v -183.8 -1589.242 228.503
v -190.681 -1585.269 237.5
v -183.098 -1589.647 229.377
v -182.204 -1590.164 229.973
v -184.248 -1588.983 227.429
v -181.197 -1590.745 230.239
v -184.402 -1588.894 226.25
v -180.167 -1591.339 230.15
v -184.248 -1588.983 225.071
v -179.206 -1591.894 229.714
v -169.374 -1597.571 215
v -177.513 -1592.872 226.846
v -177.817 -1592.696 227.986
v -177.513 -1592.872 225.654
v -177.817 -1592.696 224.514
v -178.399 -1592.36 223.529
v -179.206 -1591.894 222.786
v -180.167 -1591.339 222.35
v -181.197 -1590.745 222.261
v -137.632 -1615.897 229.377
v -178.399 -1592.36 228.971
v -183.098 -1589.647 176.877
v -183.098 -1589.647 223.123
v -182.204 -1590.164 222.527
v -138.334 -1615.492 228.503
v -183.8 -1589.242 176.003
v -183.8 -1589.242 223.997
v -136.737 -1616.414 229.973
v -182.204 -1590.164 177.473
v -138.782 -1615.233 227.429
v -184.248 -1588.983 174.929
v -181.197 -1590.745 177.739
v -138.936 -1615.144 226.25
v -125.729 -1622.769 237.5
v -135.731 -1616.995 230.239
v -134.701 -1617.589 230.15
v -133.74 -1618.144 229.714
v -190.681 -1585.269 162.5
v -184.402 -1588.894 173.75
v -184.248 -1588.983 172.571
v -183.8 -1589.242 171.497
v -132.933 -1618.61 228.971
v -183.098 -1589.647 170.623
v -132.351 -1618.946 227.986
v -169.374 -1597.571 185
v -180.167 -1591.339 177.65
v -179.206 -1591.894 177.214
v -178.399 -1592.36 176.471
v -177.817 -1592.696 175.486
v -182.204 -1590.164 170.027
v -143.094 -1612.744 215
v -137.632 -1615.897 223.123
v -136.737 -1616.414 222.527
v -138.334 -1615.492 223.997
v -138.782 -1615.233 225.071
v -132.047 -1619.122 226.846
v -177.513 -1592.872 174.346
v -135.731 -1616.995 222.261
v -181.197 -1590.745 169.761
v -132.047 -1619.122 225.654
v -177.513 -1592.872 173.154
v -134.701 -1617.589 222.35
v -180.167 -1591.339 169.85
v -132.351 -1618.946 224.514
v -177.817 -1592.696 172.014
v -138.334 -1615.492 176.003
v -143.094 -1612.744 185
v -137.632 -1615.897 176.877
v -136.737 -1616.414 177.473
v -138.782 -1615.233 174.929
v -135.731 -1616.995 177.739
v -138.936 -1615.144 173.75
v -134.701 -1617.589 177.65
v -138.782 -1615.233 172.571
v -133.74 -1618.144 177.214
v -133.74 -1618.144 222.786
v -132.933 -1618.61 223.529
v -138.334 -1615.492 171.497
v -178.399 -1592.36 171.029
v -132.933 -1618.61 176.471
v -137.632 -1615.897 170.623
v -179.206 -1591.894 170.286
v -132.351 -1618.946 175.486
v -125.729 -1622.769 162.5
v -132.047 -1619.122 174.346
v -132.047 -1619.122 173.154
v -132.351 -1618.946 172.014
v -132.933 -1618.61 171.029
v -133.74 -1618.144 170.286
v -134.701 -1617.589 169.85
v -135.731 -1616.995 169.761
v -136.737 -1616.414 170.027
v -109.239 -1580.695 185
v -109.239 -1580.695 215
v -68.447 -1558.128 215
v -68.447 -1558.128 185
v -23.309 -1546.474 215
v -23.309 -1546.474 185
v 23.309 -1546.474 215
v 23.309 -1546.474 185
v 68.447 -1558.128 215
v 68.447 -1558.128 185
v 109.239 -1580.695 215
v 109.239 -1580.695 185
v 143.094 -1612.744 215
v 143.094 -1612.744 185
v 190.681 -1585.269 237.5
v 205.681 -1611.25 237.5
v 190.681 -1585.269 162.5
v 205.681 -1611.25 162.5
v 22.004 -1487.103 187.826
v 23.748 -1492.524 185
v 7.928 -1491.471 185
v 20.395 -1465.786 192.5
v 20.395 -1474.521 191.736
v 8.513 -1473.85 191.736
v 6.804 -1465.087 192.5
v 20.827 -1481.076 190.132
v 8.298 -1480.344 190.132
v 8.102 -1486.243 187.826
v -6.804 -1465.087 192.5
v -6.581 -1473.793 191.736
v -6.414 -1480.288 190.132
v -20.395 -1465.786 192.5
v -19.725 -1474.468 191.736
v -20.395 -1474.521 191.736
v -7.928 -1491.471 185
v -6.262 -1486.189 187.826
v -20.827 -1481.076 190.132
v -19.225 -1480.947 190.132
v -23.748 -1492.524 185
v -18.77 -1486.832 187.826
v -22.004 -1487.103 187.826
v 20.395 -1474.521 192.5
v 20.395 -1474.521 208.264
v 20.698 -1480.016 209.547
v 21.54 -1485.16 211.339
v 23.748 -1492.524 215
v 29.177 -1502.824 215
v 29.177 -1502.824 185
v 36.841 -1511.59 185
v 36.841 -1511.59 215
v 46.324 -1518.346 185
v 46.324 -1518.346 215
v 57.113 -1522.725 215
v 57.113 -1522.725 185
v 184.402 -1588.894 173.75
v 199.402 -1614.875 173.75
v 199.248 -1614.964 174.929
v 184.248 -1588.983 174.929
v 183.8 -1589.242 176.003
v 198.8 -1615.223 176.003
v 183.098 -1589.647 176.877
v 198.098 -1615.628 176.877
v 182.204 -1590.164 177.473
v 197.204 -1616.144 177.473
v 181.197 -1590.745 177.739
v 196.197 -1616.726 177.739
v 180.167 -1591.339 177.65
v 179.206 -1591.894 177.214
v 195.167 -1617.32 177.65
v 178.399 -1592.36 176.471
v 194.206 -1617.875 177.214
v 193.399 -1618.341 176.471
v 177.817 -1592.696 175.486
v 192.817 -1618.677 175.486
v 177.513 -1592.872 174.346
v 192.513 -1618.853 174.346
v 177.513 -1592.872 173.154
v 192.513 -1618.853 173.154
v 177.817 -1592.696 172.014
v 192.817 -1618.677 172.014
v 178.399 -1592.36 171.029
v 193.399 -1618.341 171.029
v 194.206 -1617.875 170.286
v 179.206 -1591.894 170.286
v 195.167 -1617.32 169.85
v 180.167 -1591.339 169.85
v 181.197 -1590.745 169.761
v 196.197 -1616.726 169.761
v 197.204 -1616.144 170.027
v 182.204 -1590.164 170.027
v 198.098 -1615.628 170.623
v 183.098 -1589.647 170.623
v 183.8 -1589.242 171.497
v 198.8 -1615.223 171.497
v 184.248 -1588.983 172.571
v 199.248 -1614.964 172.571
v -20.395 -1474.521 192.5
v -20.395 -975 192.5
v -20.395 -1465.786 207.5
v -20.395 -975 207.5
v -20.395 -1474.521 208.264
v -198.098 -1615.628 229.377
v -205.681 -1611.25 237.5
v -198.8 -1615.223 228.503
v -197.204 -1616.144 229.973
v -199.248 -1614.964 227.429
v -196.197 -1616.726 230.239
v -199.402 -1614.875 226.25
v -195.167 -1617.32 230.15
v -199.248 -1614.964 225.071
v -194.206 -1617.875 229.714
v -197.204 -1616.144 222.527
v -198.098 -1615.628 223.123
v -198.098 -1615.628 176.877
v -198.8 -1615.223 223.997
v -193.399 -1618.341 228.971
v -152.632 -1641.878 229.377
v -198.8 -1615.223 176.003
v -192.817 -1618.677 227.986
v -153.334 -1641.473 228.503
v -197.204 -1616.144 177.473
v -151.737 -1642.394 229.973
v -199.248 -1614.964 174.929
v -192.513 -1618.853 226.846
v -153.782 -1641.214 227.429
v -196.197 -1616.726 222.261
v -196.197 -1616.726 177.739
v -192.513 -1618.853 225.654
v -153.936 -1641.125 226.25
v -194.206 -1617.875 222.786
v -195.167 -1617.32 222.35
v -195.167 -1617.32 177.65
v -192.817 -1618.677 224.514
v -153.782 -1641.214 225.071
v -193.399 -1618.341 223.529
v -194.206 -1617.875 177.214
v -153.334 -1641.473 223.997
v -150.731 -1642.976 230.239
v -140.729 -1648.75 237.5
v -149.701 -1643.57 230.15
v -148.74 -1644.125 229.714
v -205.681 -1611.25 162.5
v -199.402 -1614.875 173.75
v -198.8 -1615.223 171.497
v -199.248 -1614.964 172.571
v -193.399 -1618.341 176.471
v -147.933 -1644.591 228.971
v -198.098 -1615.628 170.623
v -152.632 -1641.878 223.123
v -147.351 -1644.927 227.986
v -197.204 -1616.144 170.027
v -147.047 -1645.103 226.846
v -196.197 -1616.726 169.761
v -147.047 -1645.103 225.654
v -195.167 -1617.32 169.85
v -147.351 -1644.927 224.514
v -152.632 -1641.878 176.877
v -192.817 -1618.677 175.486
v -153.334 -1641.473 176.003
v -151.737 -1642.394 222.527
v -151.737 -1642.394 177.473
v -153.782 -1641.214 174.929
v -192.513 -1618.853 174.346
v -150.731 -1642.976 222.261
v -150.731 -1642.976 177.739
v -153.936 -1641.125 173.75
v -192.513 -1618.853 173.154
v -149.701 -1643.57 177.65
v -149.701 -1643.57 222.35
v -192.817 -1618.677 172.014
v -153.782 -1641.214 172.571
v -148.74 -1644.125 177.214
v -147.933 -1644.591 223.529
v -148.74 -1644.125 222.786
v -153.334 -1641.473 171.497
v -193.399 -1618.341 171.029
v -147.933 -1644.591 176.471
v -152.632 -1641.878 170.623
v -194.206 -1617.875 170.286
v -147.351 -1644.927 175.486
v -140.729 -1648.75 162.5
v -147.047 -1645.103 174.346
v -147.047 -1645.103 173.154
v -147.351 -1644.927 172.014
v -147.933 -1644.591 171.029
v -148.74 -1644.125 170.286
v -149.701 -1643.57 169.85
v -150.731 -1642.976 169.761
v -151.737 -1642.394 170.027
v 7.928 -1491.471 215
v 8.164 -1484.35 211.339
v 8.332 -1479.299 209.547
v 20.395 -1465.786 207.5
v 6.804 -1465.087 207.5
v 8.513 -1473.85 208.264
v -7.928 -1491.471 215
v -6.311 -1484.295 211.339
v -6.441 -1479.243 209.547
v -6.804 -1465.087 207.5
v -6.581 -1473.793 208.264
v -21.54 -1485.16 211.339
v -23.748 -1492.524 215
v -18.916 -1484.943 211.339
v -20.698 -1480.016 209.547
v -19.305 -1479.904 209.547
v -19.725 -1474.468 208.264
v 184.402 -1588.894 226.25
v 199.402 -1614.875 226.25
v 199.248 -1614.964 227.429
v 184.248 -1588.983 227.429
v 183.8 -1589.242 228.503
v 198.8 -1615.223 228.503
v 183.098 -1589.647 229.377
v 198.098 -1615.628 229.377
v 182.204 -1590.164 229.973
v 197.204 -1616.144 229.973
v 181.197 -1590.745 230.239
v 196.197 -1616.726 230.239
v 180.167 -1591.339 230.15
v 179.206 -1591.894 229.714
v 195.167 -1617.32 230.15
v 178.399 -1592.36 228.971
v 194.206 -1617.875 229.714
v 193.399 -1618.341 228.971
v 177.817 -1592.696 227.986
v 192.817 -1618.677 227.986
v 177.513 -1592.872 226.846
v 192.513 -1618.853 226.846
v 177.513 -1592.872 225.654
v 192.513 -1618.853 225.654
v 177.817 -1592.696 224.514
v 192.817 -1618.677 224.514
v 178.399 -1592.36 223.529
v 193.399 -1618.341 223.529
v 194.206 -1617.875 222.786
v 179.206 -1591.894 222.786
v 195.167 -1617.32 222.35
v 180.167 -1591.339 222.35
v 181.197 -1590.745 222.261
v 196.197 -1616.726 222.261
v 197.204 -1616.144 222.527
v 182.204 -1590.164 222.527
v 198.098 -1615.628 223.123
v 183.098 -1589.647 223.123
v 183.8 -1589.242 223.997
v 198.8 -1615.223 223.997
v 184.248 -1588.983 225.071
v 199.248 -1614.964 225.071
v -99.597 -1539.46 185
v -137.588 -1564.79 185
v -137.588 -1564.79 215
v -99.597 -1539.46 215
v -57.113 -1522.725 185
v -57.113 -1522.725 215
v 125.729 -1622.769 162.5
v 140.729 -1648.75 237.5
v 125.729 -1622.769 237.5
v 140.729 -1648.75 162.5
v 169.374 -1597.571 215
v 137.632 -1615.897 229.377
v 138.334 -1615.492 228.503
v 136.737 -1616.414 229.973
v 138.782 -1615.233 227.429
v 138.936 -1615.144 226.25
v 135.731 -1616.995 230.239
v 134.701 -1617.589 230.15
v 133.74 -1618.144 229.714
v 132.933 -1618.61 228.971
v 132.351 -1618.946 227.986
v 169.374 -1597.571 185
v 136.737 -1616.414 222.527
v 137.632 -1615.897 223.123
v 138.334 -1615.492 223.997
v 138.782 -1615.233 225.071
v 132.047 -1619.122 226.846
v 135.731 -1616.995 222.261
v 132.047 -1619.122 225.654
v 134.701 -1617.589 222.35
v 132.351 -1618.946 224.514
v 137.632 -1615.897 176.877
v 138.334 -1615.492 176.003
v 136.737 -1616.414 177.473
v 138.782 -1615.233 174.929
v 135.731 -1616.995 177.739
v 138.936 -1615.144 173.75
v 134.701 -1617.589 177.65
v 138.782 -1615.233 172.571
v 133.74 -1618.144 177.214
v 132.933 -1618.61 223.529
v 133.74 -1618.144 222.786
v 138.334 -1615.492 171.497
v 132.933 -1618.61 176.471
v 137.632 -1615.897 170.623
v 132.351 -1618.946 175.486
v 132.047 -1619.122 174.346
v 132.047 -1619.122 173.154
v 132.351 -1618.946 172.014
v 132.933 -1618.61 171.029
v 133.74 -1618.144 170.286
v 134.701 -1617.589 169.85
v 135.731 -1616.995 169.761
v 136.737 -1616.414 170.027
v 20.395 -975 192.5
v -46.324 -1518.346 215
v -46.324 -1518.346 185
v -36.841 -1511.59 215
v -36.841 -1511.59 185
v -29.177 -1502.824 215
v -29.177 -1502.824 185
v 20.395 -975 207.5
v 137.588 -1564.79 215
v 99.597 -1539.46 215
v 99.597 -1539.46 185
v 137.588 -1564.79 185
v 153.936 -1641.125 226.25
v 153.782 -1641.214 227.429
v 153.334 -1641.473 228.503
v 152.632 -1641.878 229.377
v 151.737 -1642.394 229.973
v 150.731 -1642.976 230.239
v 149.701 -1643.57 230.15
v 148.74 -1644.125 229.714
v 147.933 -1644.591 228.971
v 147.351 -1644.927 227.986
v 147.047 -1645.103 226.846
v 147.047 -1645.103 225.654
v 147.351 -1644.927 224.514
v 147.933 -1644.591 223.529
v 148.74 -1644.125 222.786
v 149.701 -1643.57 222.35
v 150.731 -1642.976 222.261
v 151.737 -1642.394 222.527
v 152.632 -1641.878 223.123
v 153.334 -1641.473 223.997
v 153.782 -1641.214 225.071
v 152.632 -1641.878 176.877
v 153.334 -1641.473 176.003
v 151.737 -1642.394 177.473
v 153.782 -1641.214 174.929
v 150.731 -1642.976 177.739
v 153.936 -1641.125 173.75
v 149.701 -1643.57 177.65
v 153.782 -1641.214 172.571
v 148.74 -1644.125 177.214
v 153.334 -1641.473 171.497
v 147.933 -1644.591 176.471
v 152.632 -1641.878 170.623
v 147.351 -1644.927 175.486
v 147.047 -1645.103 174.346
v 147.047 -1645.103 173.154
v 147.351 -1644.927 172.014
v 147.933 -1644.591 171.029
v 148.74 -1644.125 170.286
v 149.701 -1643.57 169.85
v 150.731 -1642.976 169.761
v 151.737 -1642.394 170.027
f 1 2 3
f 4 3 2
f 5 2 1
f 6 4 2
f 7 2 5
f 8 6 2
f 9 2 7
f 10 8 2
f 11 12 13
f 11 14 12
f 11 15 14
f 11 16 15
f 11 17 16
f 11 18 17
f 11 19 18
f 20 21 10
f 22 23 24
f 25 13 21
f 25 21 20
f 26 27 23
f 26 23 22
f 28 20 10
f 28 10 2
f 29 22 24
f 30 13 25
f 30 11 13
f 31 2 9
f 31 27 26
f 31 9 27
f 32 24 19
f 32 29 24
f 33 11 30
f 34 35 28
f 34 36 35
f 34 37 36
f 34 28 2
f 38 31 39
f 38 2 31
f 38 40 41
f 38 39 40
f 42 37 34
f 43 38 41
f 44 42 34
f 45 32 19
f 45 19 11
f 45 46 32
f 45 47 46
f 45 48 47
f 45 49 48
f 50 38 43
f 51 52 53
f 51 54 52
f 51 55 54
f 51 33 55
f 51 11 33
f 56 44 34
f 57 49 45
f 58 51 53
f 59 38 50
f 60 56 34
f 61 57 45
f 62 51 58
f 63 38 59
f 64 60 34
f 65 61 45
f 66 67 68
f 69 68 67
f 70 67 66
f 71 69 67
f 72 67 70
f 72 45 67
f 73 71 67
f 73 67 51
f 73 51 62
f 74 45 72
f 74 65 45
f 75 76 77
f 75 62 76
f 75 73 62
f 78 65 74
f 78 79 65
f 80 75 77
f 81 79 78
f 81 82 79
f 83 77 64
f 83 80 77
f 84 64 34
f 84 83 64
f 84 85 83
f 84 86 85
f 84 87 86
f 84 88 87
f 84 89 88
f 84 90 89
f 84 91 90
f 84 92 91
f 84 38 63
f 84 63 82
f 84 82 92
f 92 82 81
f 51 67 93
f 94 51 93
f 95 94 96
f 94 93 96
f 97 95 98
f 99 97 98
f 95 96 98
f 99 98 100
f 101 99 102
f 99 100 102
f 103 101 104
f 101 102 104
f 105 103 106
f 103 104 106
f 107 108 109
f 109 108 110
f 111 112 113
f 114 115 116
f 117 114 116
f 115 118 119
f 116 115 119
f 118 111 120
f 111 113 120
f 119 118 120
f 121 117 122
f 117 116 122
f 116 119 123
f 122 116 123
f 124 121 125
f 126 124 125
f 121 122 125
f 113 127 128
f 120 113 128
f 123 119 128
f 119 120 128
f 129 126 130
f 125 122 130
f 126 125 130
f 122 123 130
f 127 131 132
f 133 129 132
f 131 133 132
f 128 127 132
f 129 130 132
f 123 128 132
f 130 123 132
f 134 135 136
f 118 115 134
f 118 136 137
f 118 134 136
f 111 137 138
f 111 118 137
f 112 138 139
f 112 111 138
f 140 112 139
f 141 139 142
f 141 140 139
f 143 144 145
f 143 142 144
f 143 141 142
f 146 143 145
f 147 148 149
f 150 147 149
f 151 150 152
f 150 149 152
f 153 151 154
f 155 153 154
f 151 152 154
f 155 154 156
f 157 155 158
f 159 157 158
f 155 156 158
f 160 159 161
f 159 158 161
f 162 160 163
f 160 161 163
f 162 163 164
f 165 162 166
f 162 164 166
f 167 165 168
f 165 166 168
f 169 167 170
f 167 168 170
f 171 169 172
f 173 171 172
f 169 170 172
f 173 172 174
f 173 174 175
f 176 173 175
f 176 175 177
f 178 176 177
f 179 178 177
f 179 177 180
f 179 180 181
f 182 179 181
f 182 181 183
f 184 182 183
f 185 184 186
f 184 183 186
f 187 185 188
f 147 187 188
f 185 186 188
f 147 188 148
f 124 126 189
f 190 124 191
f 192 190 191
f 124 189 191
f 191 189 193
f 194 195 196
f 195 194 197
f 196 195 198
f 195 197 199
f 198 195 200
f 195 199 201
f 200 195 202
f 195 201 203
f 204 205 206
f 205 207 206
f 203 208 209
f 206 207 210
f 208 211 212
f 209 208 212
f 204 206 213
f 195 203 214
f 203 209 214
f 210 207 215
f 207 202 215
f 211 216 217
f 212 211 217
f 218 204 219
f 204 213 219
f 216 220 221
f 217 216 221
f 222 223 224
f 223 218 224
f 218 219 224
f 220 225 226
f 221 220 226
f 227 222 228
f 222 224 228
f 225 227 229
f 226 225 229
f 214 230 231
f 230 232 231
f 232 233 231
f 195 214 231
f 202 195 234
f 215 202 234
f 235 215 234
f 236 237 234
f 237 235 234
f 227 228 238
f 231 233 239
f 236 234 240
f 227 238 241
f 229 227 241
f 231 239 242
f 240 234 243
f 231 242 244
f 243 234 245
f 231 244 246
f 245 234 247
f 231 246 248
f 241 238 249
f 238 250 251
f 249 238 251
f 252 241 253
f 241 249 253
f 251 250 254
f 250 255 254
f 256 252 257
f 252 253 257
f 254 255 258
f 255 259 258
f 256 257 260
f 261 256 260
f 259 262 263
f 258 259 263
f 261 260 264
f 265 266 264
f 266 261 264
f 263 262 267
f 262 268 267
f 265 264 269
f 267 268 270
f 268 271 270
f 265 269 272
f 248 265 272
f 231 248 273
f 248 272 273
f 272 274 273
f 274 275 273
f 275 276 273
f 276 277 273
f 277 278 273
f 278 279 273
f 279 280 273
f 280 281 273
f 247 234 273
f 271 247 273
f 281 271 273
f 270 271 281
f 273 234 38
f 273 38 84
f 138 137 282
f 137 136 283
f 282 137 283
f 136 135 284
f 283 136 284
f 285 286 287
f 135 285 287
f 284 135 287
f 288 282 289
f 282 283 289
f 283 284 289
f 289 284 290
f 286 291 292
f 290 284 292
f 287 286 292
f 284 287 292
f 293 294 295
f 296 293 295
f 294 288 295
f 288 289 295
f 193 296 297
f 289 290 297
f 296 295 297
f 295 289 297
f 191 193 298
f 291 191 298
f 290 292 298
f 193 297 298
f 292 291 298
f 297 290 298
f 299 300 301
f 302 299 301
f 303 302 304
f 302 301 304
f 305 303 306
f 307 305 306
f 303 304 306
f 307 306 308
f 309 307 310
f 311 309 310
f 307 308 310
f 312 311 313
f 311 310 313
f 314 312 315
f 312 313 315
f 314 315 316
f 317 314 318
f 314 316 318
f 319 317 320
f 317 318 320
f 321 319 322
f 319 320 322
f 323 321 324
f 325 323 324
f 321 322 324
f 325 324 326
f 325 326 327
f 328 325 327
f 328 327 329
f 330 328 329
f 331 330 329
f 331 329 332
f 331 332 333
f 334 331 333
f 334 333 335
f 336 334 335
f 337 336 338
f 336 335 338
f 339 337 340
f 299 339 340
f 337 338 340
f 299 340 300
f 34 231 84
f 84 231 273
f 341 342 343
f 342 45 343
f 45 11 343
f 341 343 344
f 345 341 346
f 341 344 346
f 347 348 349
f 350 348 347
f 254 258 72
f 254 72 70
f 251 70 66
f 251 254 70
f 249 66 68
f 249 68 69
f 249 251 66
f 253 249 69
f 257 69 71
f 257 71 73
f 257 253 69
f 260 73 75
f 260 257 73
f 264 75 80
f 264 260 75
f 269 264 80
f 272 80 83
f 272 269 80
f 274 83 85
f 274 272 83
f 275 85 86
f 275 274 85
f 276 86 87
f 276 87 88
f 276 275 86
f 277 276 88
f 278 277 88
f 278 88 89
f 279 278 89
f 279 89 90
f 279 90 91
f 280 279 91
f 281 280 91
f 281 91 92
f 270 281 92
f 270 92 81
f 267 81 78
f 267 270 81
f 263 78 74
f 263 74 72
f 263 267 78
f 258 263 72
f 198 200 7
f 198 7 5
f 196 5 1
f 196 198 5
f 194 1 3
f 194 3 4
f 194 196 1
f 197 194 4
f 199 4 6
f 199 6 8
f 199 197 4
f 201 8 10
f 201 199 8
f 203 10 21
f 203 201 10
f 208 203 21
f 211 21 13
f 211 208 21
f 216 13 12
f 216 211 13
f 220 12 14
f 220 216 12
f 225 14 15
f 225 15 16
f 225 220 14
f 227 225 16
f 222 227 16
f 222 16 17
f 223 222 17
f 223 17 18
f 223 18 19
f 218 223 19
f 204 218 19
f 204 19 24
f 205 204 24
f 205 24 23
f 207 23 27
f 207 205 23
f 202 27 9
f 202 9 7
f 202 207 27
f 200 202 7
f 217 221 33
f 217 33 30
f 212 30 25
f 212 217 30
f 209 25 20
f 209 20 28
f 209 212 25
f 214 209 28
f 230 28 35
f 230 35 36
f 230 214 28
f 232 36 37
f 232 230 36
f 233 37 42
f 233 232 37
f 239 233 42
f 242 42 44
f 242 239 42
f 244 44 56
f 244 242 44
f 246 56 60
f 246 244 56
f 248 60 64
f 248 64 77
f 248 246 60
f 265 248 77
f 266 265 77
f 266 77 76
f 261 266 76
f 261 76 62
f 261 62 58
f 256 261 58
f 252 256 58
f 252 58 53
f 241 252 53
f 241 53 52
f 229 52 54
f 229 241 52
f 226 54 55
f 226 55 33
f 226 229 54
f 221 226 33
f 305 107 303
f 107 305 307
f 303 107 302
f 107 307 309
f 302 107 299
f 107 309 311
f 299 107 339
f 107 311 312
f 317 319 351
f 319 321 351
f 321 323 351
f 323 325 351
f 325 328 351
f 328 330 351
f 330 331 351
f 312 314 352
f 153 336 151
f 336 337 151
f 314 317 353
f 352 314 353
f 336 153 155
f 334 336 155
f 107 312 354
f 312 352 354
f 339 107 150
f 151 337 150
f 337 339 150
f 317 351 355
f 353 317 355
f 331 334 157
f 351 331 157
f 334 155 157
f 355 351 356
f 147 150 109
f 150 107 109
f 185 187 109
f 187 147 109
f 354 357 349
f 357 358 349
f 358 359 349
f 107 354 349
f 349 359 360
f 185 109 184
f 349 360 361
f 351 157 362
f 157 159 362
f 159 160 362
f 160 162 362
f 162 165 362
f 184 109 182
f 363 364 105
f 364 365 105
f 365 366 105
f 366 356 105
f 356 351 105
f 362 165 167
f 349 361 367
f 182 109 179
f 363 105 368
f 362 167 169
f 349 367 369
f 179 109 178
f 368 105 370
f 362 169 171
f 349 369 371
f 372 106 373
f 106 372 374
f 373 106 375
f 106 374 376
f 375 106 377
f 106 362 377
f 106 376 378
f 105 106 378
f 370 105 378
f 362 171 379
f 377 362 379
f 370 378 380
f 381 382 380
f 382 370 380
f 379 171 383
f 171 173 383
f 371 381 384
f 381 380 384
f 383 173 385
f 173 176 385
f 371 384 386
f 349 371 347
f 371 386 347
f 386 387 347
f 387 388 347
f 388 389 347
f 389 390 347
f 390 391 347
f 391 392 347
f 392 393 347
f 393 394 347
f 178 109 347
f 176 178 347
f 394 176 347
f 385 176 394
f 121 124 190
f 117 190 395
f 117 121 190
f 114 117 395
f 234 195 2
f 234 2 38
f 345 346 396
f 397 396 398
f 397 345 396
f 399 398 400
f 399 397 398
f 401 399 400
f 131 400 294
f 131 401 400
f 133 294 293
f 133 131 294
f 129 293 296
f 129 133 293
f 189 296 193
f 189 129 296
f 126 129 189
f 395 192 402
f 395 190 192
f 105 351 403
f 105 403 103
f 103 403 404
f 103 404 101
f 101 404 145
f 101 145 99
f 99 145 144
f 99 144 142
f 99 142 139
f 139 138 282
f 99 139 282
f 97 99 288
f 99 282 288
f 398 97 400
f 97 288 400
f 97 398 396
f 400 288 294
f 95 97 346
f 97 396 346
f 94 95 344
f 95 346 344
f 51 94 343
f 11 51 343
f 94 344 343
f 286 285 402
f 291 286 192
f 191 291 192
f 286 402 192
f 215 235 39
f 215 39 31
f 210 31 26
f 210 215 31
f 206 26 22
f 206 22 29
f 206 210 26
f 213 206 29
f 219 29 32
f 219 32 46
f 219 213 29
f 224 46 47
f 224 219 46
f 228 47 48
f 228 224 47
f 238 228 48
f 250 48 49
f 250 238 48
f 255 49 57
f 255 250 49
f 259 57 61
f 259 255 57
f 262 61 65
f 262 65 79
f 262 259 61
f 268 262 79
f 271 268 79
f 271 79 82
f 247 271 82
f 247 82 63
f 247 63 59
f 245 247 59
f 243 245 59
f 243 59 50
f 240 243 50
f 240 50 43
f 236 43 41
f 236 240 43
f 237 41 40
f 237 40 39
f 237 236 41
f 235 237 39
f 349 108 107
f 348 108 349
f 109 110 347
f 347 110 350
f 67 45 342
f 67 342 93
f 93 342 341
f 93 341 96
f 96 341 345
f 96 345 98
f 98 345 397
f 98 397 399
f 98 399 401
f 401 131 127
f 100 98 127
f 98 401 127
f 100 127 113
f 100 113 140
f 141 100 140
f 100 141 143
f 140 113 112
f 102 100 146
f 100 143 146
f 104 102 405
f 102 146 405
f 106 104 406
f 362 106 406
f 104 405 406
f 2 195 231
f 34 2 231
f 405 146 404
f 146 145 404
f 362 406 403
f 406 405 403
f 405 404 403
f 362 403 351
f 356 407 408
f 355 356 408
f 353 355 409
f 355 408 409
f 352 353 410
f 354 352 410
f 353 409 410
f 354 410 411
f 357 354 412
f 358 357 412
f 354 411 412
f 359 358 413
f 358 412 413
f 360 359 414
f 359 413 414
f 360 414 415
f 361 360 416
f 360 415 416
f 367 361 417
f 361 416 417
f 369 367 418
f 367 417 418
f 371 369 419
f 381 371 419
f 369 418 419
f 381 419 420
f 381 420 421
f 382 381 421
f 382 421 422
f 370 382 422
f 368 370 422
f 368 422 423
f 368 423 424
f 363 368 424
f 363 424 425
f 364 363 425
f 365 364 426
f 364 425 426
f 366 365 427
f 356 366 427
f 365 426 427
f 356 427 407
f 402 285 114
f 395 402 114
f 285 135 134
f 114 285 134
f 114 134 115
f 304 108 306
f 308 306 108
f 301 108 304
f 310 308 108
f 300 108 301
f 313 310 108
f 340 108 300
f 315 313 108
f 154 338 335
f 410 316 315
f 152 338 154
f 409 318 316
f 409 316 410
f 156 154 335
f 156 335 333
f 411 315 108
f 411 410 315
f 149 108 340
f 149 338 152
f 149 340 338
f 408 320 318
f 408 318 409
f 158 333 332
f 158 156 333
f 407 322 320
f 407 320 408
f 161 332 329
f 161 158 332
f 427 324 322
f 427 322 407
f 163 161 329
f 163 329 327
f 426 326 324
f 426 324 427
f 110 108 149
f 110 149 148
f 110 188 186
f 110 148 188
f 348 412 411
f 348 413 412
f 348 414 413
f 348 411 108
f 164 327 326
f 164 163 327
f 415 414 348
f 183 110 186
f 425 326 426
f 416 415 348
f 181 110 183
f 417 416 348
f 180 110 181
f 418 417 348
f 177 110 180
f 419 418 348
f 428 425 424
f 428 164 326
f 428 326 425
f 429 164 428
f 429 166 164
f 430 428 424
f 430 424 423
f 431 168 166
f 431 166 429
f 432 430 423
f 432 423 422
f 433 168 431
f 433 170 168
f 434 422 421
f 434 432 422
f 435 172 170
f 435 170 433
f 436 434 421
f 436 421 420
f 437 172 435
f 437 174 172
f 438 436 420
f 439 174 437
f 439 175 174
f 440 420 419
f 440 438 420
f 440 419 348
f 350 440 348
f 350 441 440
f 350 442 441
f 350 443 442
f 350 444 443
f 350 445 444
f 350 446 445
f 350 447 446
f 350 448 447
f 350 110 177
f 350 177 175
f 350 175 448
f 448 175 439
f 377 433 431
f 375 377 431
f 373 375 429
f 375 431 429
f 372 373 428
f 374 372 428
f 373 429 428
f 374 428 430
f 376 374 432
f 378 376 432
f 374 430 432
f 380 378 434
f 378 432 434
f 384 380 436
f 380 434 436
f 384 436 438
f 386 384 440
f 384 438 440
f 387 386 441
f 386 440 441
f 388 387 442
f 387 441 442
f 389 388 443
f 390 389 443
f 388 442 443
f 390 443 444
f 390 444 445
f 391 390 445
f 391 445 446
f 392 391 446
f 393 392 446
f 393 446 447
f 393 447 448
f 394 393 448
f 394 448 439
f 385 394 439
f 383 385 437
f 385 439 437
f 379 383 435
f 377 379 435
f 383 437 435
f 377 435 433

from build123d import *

# Parameters (mm, degrees)
SKETCH1_R                = 8.2
BOSS_EXTRUDE1_DEPTH      = 25
SKETCH2_W                = 40.79
SKETCH2_H                = 15
BOSS_EXTRUDE2_DEPTH      = 25
SKETCH3_R                = 12.5
BOSS_EXTRUDE4_DEPTH      = 25
BOSS_EXTRUDE5_REACH      = 51.448
SKETCH5_W                = 40.79
SKETCH5_H                = 15
BOSS_EXTRUDE7_DEPTH      = 1505
BOSS_EXTRUDE8_START      = -40.79
BOSS_EXTRUDE8_DEPTH      = 40.79
SKETCH9_W                = 15
SKETCH9_H                = 15
REVOLVE1_ANGLE           = 60
REVOLVE1_OTHER_WAY_ANGLE = 60
FILLET3_R                = 50
SKETCH11_W               = 75
SKETCH11_H               = 75
SKETCH11_R               = 4
BOSS_EXTRUDE9_DEPTH      = 30
CUT_EXTRUDE2_DEPTH       = 1755.203433898
SKETCH16_R               = 677.859439882
CUT_EXTRUDE3_DEPTH       = 1049.19413159


with BuildPart() as part:
    # Sketch1 → Boss-Extrude1 (new body)
    with BuildSketch(Plane(origin=(0, 0, 0), x_dir=(1, 0, 0), z_dir=(0, 1, 0))):
        with Locations(Location((0, 0, 0), (0, 0, 270))):
            Circle(SKETCH1_R)
    extrude(amount=BOSS_EXTRUDE1_DEPTH)

    # Sketch2 → Boss-Extrude2 (add)
    with BuildSketch(Plane(origin=(0, 0, 0), x_dir=(-1, 0, 0), z_dir=(0, -1, 0))):
        Rectangle(SKETCH2_W, SKETCH2_H)
    extrude(amount=BOSS_EXTRUDE2_DEPTH)

    # Sketch3 → Boss-Extrude4 (add)
    with BuildSketch(Plane(origin=(0, -25, 0), x_dir=(-1, 0, 0), z_dir=(0, -1, 0))):
        Circle(SKETCH3_R)
    extrude(amount=-BOSS_EXTRUDE4_DEPTH)

    # Boss-Extrude5: up to this face of the body (flat: up to its plane)
    boss_extrude5_end = Plane(part.part.faces().sort_by_distance((20.395, -12.5, 0))[0])
    # Sketch4 → Boss-Extrude5 (add, up to the picked face)
    with BuildSketch(Plane.ZY.offset(20.395), mode=Mode.PRIVATE) as boss_extrude5_sk1:
        Polygon((192.5, -225), (-7.5, -25), (7.5, -25), (207.5, -225), align=None)
    boss_extrude5_tool1 = split(extrude(boss_extrude5_sk1.sketch, amount=-BOSS_EXTRUDE5_REACH, mode=Mode.PRIVATE), bisect_by=boss_extrude5_end, keep=Keep.BOTH, mode=Mode.PRIVATE)
    add(boss_extrude5_tool1.solids().sort_by(Axis((-20.395, -125, 100), (1, 0, 0)))[0])

    # Sketch5 → Boss-Extrude7 (add)
    with BuildSketch(Plane(origin=(0, -225, 0), x_dir=(-1, 0, 0), z_dir=(0, -1, 0))):
        with Locations((0, -200)):
            Rectangle(SKETCH5_W, SKETCH5_H)
    extrude(amount=BOSS_EXTRUDE7_DEPTH)

    # Sketch7 → Boss-Extrude8 (add)
    with BuildSketch(Plane(origin=(20.395, 0, 0), x_dir=(0, 0, -1), z_dir=(1, 0, 0)).offset(BOSS_EXTRUDE8_START)):
        Polygon((1.552099385, -34.052099385), (0, -32.5), (-192.5, -225), (-192.5, -228.104198769), align=None)
        Polygon((7.5, -25), (0, -32.5), (1.552099385, -34.052099385), (7.5, -28.104198769), align=None)
        Polygon((-9.052099385, -23.447900615), (-207.5, -221.895801231), (-207.5, -225), (-7.5, -25), align=None)
        Polygon((-9.052099385, -23.447900615), (-7.5, -25), (-7.5, -21.895801231), align=None)
    extrude(amount=BOSS_EXTRUDE8_DEPTH)

    # Sketch9 → Revolve1 (revolve)
    with BuildSketch(Plane(origin=(0, 0, 0), x_dir=(0, 0, -1), z_dir=(1, 0, 0))):
        with Locations((-207.5, -1522.5)):
            Rectangle(SKETCH9_W, SKETCH9_H)
        Polygon((-185, -1545), (-185, -1530), (-200, -1530), (-215, -1530), (-215, -1545), align=None)
        with Locations((-192.5, -1522.5)):
            Rectangle(SKETCH9_W, SKETCH9_H)
    revolve(axis=Axis((0, -1730, 192.5), (0, 0, 1)), revolution_arc=REVOLVE1_ANGLE)

    # Sketch9 → Revolve1 other way (revolve)
    with BuildSketch(Plane(origin=(0, 0, 0), x_dir=(0, 0, -1), z_dir=(1, 0, 0))):
        with Locations((-207.5, -1522.5)):
            Rectangle(SKETCH9_W, SKETCH9_H)
        Polygon((-185, -1545), (-185, -1530), (-200, -1530), (-215, -1530), (-215, -1545), align=None)
        with Locations((-192.5, -1522.5)):
            Rectangle(SKETCH9_W, SKETCH9_H)
    revolve(axis=Axis((0, -1730, 192.5), (0, 0, -1)), revolution_arc=REVOLVE1_OTHER_WAY_ANGLE)

    # Fillet3
    # the kernel refuses this fillet: 50 mm, written as the material it adds along each edge
    with BuildSketch(Plane(origin=(0, -1730, 207.5), x_dir=(0.6259913130832682, 0.7798300301631668, 0), z_dir=(0.7798300301631668, -0.6259913130832682, 0))) as fillet3_piece_1_section:
        with BuildLine():
            CenterArc((215 + FILLET3_R, FILLET3_R), FILLET3_R, 180, 90)
            Line((215, FILLET3_R), (215, 0))
            Line((215, 0), (215 + FILLET3_R, 0))
        make_face()
    fillet3_piece_1 = revolve(axis=Axis((0, -1730, 207.5), (0, 0, 1)), revolution_arc=77.509968484, mode=Mode.PRIVATE)
    fillet3_piece_1 = split(fillet3_piece_1, bisect_by=Plane(origin=(20.395, -1497.728593149, 210.201005202), z_dir=(-1, 0, 0)), keep=Keep.TOP, mode=Mode.PRIVATE)
    fillet3_piece_1 = split(fillet3_piece_1, bisect_by=Plane(origin=(-20.395, -1497.728593149, 210.201005202), z_dir=(1, 0, 0)), keep=Keep.TOP, mode=Mode.PRIVATE)
    fillet3_piece_1 = split(fillet3_piece_1, bisect_by=Plane(origin=(0, -1497.728593149, 215), z_dir=(0, 0, -1)), keep=Keep.TOP, mode=Mode.PRIVATE)
    add(fillet3_piece_1)
    with BuildSketch(Plane(origin=(-20.395, -1515.969525593, 192.5), x_dir=(-0.9834951946600375, -0.1809342479482942, 0), z_dir=(0, 0, 1))) as fillet3_piece_2:
        with BuildLine():
            CenterArc((41.675293239, -49.811185367), FILLET3_R, 94.980893043, 74.594925131)
            Line((-7.499466494, -40.764472969), (0, 0))
            ThreePointArc((0, 0), (18.66705843, -0.811902923), (37.33411686, 0))
        make_face()
    extrude(amount=15)
    with BuildSketch(Plane(origin=(0, -1730, 192.5), x_dir=(0.6259913130832687, 0.7798300301631664, 0), z_dir=(0.7798300301631664, -0.6259913130832687, 0))) as fillet3_piece_3_section:
        with BuildLine():
            CenterArc((215 + FILLET3_R, -FILLET3_R), FILLET3_R, 90, 90)
            Line((215 + FILLET3_R, 0), (215, 0))
            Line((215, 0), (215, -FILLET3_R))
        make_face()
    fillet3_piece_3 = revolve(axis=Axis((0, -1730, 192.5), (0, 0, 1)), revolution_arc=77.509968484, mode=Mode.PRIVATE)
    fillet3_piece_3 = split(fillet3_piece_3, bisect_by=Plane(origin=(0, -1497.728593149, 185), z_dir=(0, 0, 1)), keep=Keep.TOP, mode=Mode.PRIVATE)
    fillet3_piece_3 = split(fillet3_piece_3, bisect_by=Plane(origin=(-20.395, -1497.728593149, 189.798994798), z_dir=(1, 0, 0)), keep=Keep.TOP, mode=Mode.PRIVATE)
    fillet3_piece_3 = split(fillet3_piece_3, bisect_by=Plane(origin=(20.395, -1497.728593149, 189.798994798), z_dir=(-1, 0, 0)), keep=Keep.TOP, mode=Mode.PRIVATE)
    add(fillet3_piece_3)
    with BuildSketch(Plane(origin=(20.395, -1515.969525593, 192.5), x_dir=(0.9834951946600374, -0.18093424794829469, 0), z_dir=(0, 0, 1))) as fillet3_piece_4:
        with BuildLine():
            CenterArc((41.675293239, 49.811185367), FILLET3_R, 190.424181826, 74.594925131)
            Line((-7.499466494, 40.764472969), (0, 0))
            ThreePointArc((0, 0), (18.66705843, 0.811902923), (37.33411686, 0))
        make_face()
    extrude(amount=15)
    with BuildSketch(Plane(origin=(0, -1730, 207.5), x_dir=(0.6259913130832682, 0.7798300301631668, 0), z_dir=(0.7798300301631668, -0.6259913130832682, 0))) as fillet3_piece_5a_section:
        with BuildLine():
            CenterArc((215 + FILLET3_R, FILLET3_R), FILLET3_R, 180, 90)
            Line((215, FILLET3_R), (215, 0))
            Line((215, 0), (215 + FILLET3_R, 0))
        make_face()
    fillet3_piece_5a = revolve(axis=Axis((0, -1730, 207.5), (0, 0, 1)), revolution_arc=77.509968484, mode=Mode.PRIVATE)
    fillet3_piece_5a = split(fillet3_piece_5a, bisect_by=Plane(origin=(20.395, -1516.663886588, 210.150724115), z_dir=(1, 0, 0)), keep=Keep.TOP, mode=Mode.PRIVATE)
    fillet3_piece_5a = split(fillet3_piece_5a, bisect_by=Plane(origin=(85.698064456, -1516.663886588, 215), z_dir=(0, 0, -1)), keep=Keep.TOP, mode=Mode.PRIVATE)
    with BuildSketch(Plane(origin=(20.395, -1515.969525593, 192.5), x_dir=(0.9834951946600374, -0.18093424794829469, 0), z_dir=(0, 0, 1))) as fillet3_piece_5b_section:
        with BuildLine():
            CenterArc((41.675293239, 49.811185367), FILLET3_R, 190.424181826, 74.594925131)
            Line((-7.499466494, 40.764472969), (0, 0))
            ThreePointArc((0, 0), (18.66705843, 0.811902923), (37.33411686, 0))
        make_face()
    fillet3_piece_5b = extrude(amount=118.621434021, mode=Mode.PRIVATE)
    fillet3_piece_5b = split(fillet3_piece_5b, bisect_by=Plane(origin=(28.539652215, -1507.603520272, 207.5), z_dir=(0, 0, 1)), keep=Keep.TOP, mode=Mode.PRIVATE)
    fillet3_piece_5b = split(fillet3_piece_5b, bisect_by=Plane(origin=(28.539652215, -1507.603520272, 215), z_dir=(0, 0, -1)), keep=Keep.TOP, mode=Mode.PRIVATE)
    fillet3_piece_5 = fillet3_piece_5a & fillet3_piece_5b
    add(fillet3_piece_5)
    with BuildSketch(Plane(origin=(0, -1730, 207.5), x_dir=(0.6259913130832682, 0.7798300301631668, 0), z_dir=(0.7798300301631668, -0.6259913130832682, 0))) as fillet3_piece_6a_section:
        with BuildLine():
            CenterArc((215 + FILLET3_R, FILLET3_R), FILLET3_R, 180, 90)
            Line((215, FILLET3_R), (215, 0))
            Line((215, 0), (215 + FILLET3_R, 0))
        make_face()
    fillet3_piece_6a = revolve(axis=Axis((0, -1730, 207.5), (0, 0, 1)), revolution_arc=77.509968484, mode=Mode.PRIVATE)
    fillet3_piece_6a = split(fillet3_piece_6a, bisect_by=Plane(origin=(-20.395, -1516.663887252, 210.150724175), z_dir=(-1, 0, 0)), keep=Keep.TOP, mode=Mode.PRIVATE)
    fillet3_piece_6a = split(fillet3_piece_6a, bisect_by=Plane(origin=(-85.69806423, -1516.663887252, 215), z_dir=(0, 0, -1)), keep=Keep.TOP, mode=Mode.PRIVATE)
    with BuildSketch(Plane(origin=(-20.395, -1515.969525593, 192.5), x_dir=(-0.9834951946600375, -0.1809342479482942, 0), z_dir=(0, 0, 1))) as fillet3_piece_6b_section:
        with BuildLine():
            CenterArc((41.675293239, -49.811185367), FILLET3_R, 94.980893043, 74.594925131)
            Line((-7.499466494, -40.764472969), (0, 0))
            ThreePointArc((0, 0), (18.66705843, -0.811902923), (37.33411686, 0))
        make_face()
    fillet3_piece_6b = extrude(amount=118.621434021, mode=Mode.PRIVATE)
    fillet3_piece_6b = split(fillet3_piece_6b, bisect_by=Plane(origin=(-28.539652215, -1507.603520272, 207.5), z_dir=(0, 0, 1)), keep=Keep.TOP, mode=Mode.PRIVATE)
    fillet3_piece_6b = split(fillet3_piece_6b, bisect_by=Plane(origin=(-28.539652215, -1507.603520272, 215), z_dir=(0, 0, -1)), keep=Keep.TOP, mode=Mode.PRIVATE)
    fillet3_piece_6 = fillet3_piece_6a & fillet3_piece_6b
    add(fillet3_piece_6)
    with BuildSketch(Plane(origin=(0, -1730, 192.5), x_dir=(0.6259913130832687, 0.7798300301631664, 0), z_dir=(0.7798300301631664, -0.6259913130832687, 0))) as fillet3_piece_7a_section:
        with BuildLine():
            CenterArc((215 + FILLET3_R, -FILLET3_R), FILLET3_R, 90, 90)
            Line((215 + FILLET3_R, 0), (215, 0))
            Line((215, 0), (215, -FILLET3_R))
        make_face()
    fillet3_piece_7a = revolve(axis=Axis((0, -1730, 192.5), (0, 0, 1)), revolution_arc=77.509968484, mode=Mode.PRIVATE)
    fillet3_piece_7a = split(fillet3_piece_7a, bisect_by=Plane(origin=(-85.69806423, -1516.663887252, 185), z_dir=(0, 0, 1)), keep=Keep.TOP, mode=Mode.PRIVATE)
    fillet3_piece_7a = split(fillet3_piece_7a, bisect_by=Plane(origin=(-20.395, -1516.663887252, 189.849275825), z_dir=(-1, 0, 0)), keep=Keep.TOP, mode=Mode.PRIVATE)
    with BuildSketch(Plane(origin=(-20.395, -1515.969525593, 88.878565979), x_dir=(-0.9834951946600375, -0.1809342479482942, 0), z_dir=(0, 0, 1))) as fillet3_piece_7b_section:
        with BuildLine():
            CenterArc((41.675293239, -49.811185367), FILLET3_R, 94.980893043, 74.594925131)
            Line((-7.499466494, -40.764472969), (0, 0))
            ThreePointArc((0, 0), (18.66705843, -0.811902923), (37.33411686, 0))
        make_face()
    fillet3_piece_7b = extrude(amount=118.621434021, mode=Mode.PRIVATE)
    fillet3_piece_7b = split(fillet3_piece_7b, bisect_by=Plane(origin=(-28.539652215, -1507.603520272, 185), z_dir=(0, 0, 1)), keep=Keep.TOP, mode=Mode.PRIVATE)
    fillet3_piece_7b = split(fillet3_piece_7b, bisect_by=Plane(origin=(-28.539652215, -1507.603520272, 192.5), z_dir=(0, 0, -1)), keep=Keep.TOP, mode=Mode.PRIVATE)
    fillet3_piece_7 = fillet3_piece_7a & fillet3_piece_7b
    add(fillet3_piece_7)
    with BuildSketch(Plane(origin=(0, -1730, 192.5), x_dir=(0.6259913130832687, 0.7798300301631664, 0), z_dir=(0.7798300301631664, -0.6259913130832687, 0))) as fillet3_piece_8a_section:
        with BuildLine():
            CenterArc((215 + FILLET3_R, -FILLET3_R), FILLET3_R, 90, 90)
            Line((215 + FILLET3_R, 0), (215, 0))
            Line((215, 0), (215, -FILLET3_R))
        make_face()
    fillet3_piece_8a = revolve(axis=Axis((0, -1730, 192.5), (0, 0, 1)), revolution_arc=77.509968484, mode=Mode.PRIVATE)
    fillet3_piece_8a = split(fillet3_piece_8a, bisect_by=Plane(origin=(85.698064456, -1516.663886588, 185), z_dir=(0, 0, 1)), keep=Keep.TOP, mode=Mode.PRIVATE)
    fillet3_piece_8a = split(fillet3_piece_8a, bisect_by=Plane(origin=(20.395, -1516.663886588, 189.849275885), z_dir=(1, 0, 0)), keep=Keep.TOP, mode=Mode.PRIVATE)
    with BuildSketch(Plane(origin=(20.395, -1515.969525593, 88.878565979), x_dir=(0.9834951946600374, -0.1809342479482948, 0), z_dir=(0, 0, 1))) as fillet3_piece_8b_section:
        with BuildLine():
            CenterArc((41.675293239, 49.811185367), FILLET3_R, 190.424181826, 74.594925131)
            Line((-7.499466494, 40.764472969), (0, 0))
            ThreePointArc((0, 0), (18.66705843, 0.811902923), (37.33411686, 0))
        make_face()
    fillet3_piece_8b = extrude(amount=118.621434021, mode=Mode.PRIVATE)
    fillet3_piece_8b = split(fillet3_piece_8b, bisect_by=Plane(origin=(28.539652215, -1507.603520272, 185), z_dir=(0, 0, 1)), keep=Keep.TOP, mode=Mode.PRIVATE)
    fillet3_piece_8b = split(fillet3_piece_8b, bisect_by=Plane(origin=(28.539652215, -1507.603520272, 192.5), z_dir=(0, 0, -1)), keep=Keep.TOP, mode=Mode.PRIVATE)
    fillet3_piece_8 = fillet3_piece_8a & fillet3_piece_8b
    add(fillet3_piece_8)

    # Sketch11 → Boss-Extrude9 (add)
    with BuildSketch(Plane(origin=(749.111974274, -1297.5, 0), x_dir=(-0.8660254037844398, -0.49999999999999806, 0), z_dir=(0.499999999999998, -0.8660254037844397, 0))):
        with Locations((665, -200)):
            Rectangle(SKETCH11_W, SKETCH11_H)
        with Locations(Location((638.75, -173.75, 0), (0, 0, 180))):
            Circle(SKETCH11_R, mode=Mode.SUBTRACT)
        with Locations(Location((691.25, -173.75, 0), (0, 0, 180))):
            Circle(SKETCH11_R, mode=Mode.SUBTRACT)
        with Locations(Location((691.25, -226.25, 0), (0, 0, 180))):
            Circle(SKETCH11_R, mode=Mode.SUBTRACT)
        with Locations(Location((638.75, -226.25, 0), (0, 0, 180))):
            Circle(SKETCH11_R, mode=Mode.SUBTRACT)
    boss_extrude9 = extrude(amount=-BOSS_EXTRUDE9_DEPTH)

    # Mirror1: Boss-Extrude9 across plane
    add(boss_extrude9.mirror(Plane(origin=(0, 0, 0), x_dir=(0, 0, 1), z_dir=(1, 0, 0))))

    # Sketch15 → Cut-Extrude2 (cut, through all)
    with BuildSketch(Plane(origin=(0, 0, 192.5), x_dir=(-1, 0, 0), z_dir=(0, 0, -1))):
        with BuildLine():
            Line((-20.395, -1730), (-20.395, -1546.127642167))
            ThreePointArc((-20.395, -1546.127642167), (0, -1545), (20.395, -1546.127642167))
            Line((20.395, -1546.127642167), (20.395, -1730))
            Line((20.395, -1730), (-20.395, -1730))
        make_face()
    extrude(amount=-CUT_EXTRUDE2_DEPTH, mode=Mode.SUBTRACT)

    # Sketch16 → Cut-Extrude3 (cut, through all)
    with BuildSketch(Plane(origin=(0, -975, 0), x_dir=(1, 0, 0), z_dir=(0, 1, 0))):
        Circle(SKETCH16_R)
    extrude(amount=CUT_EXTRUDE3_DEPTH, mode=Mode.SUBTRACT)


solid = part.part
